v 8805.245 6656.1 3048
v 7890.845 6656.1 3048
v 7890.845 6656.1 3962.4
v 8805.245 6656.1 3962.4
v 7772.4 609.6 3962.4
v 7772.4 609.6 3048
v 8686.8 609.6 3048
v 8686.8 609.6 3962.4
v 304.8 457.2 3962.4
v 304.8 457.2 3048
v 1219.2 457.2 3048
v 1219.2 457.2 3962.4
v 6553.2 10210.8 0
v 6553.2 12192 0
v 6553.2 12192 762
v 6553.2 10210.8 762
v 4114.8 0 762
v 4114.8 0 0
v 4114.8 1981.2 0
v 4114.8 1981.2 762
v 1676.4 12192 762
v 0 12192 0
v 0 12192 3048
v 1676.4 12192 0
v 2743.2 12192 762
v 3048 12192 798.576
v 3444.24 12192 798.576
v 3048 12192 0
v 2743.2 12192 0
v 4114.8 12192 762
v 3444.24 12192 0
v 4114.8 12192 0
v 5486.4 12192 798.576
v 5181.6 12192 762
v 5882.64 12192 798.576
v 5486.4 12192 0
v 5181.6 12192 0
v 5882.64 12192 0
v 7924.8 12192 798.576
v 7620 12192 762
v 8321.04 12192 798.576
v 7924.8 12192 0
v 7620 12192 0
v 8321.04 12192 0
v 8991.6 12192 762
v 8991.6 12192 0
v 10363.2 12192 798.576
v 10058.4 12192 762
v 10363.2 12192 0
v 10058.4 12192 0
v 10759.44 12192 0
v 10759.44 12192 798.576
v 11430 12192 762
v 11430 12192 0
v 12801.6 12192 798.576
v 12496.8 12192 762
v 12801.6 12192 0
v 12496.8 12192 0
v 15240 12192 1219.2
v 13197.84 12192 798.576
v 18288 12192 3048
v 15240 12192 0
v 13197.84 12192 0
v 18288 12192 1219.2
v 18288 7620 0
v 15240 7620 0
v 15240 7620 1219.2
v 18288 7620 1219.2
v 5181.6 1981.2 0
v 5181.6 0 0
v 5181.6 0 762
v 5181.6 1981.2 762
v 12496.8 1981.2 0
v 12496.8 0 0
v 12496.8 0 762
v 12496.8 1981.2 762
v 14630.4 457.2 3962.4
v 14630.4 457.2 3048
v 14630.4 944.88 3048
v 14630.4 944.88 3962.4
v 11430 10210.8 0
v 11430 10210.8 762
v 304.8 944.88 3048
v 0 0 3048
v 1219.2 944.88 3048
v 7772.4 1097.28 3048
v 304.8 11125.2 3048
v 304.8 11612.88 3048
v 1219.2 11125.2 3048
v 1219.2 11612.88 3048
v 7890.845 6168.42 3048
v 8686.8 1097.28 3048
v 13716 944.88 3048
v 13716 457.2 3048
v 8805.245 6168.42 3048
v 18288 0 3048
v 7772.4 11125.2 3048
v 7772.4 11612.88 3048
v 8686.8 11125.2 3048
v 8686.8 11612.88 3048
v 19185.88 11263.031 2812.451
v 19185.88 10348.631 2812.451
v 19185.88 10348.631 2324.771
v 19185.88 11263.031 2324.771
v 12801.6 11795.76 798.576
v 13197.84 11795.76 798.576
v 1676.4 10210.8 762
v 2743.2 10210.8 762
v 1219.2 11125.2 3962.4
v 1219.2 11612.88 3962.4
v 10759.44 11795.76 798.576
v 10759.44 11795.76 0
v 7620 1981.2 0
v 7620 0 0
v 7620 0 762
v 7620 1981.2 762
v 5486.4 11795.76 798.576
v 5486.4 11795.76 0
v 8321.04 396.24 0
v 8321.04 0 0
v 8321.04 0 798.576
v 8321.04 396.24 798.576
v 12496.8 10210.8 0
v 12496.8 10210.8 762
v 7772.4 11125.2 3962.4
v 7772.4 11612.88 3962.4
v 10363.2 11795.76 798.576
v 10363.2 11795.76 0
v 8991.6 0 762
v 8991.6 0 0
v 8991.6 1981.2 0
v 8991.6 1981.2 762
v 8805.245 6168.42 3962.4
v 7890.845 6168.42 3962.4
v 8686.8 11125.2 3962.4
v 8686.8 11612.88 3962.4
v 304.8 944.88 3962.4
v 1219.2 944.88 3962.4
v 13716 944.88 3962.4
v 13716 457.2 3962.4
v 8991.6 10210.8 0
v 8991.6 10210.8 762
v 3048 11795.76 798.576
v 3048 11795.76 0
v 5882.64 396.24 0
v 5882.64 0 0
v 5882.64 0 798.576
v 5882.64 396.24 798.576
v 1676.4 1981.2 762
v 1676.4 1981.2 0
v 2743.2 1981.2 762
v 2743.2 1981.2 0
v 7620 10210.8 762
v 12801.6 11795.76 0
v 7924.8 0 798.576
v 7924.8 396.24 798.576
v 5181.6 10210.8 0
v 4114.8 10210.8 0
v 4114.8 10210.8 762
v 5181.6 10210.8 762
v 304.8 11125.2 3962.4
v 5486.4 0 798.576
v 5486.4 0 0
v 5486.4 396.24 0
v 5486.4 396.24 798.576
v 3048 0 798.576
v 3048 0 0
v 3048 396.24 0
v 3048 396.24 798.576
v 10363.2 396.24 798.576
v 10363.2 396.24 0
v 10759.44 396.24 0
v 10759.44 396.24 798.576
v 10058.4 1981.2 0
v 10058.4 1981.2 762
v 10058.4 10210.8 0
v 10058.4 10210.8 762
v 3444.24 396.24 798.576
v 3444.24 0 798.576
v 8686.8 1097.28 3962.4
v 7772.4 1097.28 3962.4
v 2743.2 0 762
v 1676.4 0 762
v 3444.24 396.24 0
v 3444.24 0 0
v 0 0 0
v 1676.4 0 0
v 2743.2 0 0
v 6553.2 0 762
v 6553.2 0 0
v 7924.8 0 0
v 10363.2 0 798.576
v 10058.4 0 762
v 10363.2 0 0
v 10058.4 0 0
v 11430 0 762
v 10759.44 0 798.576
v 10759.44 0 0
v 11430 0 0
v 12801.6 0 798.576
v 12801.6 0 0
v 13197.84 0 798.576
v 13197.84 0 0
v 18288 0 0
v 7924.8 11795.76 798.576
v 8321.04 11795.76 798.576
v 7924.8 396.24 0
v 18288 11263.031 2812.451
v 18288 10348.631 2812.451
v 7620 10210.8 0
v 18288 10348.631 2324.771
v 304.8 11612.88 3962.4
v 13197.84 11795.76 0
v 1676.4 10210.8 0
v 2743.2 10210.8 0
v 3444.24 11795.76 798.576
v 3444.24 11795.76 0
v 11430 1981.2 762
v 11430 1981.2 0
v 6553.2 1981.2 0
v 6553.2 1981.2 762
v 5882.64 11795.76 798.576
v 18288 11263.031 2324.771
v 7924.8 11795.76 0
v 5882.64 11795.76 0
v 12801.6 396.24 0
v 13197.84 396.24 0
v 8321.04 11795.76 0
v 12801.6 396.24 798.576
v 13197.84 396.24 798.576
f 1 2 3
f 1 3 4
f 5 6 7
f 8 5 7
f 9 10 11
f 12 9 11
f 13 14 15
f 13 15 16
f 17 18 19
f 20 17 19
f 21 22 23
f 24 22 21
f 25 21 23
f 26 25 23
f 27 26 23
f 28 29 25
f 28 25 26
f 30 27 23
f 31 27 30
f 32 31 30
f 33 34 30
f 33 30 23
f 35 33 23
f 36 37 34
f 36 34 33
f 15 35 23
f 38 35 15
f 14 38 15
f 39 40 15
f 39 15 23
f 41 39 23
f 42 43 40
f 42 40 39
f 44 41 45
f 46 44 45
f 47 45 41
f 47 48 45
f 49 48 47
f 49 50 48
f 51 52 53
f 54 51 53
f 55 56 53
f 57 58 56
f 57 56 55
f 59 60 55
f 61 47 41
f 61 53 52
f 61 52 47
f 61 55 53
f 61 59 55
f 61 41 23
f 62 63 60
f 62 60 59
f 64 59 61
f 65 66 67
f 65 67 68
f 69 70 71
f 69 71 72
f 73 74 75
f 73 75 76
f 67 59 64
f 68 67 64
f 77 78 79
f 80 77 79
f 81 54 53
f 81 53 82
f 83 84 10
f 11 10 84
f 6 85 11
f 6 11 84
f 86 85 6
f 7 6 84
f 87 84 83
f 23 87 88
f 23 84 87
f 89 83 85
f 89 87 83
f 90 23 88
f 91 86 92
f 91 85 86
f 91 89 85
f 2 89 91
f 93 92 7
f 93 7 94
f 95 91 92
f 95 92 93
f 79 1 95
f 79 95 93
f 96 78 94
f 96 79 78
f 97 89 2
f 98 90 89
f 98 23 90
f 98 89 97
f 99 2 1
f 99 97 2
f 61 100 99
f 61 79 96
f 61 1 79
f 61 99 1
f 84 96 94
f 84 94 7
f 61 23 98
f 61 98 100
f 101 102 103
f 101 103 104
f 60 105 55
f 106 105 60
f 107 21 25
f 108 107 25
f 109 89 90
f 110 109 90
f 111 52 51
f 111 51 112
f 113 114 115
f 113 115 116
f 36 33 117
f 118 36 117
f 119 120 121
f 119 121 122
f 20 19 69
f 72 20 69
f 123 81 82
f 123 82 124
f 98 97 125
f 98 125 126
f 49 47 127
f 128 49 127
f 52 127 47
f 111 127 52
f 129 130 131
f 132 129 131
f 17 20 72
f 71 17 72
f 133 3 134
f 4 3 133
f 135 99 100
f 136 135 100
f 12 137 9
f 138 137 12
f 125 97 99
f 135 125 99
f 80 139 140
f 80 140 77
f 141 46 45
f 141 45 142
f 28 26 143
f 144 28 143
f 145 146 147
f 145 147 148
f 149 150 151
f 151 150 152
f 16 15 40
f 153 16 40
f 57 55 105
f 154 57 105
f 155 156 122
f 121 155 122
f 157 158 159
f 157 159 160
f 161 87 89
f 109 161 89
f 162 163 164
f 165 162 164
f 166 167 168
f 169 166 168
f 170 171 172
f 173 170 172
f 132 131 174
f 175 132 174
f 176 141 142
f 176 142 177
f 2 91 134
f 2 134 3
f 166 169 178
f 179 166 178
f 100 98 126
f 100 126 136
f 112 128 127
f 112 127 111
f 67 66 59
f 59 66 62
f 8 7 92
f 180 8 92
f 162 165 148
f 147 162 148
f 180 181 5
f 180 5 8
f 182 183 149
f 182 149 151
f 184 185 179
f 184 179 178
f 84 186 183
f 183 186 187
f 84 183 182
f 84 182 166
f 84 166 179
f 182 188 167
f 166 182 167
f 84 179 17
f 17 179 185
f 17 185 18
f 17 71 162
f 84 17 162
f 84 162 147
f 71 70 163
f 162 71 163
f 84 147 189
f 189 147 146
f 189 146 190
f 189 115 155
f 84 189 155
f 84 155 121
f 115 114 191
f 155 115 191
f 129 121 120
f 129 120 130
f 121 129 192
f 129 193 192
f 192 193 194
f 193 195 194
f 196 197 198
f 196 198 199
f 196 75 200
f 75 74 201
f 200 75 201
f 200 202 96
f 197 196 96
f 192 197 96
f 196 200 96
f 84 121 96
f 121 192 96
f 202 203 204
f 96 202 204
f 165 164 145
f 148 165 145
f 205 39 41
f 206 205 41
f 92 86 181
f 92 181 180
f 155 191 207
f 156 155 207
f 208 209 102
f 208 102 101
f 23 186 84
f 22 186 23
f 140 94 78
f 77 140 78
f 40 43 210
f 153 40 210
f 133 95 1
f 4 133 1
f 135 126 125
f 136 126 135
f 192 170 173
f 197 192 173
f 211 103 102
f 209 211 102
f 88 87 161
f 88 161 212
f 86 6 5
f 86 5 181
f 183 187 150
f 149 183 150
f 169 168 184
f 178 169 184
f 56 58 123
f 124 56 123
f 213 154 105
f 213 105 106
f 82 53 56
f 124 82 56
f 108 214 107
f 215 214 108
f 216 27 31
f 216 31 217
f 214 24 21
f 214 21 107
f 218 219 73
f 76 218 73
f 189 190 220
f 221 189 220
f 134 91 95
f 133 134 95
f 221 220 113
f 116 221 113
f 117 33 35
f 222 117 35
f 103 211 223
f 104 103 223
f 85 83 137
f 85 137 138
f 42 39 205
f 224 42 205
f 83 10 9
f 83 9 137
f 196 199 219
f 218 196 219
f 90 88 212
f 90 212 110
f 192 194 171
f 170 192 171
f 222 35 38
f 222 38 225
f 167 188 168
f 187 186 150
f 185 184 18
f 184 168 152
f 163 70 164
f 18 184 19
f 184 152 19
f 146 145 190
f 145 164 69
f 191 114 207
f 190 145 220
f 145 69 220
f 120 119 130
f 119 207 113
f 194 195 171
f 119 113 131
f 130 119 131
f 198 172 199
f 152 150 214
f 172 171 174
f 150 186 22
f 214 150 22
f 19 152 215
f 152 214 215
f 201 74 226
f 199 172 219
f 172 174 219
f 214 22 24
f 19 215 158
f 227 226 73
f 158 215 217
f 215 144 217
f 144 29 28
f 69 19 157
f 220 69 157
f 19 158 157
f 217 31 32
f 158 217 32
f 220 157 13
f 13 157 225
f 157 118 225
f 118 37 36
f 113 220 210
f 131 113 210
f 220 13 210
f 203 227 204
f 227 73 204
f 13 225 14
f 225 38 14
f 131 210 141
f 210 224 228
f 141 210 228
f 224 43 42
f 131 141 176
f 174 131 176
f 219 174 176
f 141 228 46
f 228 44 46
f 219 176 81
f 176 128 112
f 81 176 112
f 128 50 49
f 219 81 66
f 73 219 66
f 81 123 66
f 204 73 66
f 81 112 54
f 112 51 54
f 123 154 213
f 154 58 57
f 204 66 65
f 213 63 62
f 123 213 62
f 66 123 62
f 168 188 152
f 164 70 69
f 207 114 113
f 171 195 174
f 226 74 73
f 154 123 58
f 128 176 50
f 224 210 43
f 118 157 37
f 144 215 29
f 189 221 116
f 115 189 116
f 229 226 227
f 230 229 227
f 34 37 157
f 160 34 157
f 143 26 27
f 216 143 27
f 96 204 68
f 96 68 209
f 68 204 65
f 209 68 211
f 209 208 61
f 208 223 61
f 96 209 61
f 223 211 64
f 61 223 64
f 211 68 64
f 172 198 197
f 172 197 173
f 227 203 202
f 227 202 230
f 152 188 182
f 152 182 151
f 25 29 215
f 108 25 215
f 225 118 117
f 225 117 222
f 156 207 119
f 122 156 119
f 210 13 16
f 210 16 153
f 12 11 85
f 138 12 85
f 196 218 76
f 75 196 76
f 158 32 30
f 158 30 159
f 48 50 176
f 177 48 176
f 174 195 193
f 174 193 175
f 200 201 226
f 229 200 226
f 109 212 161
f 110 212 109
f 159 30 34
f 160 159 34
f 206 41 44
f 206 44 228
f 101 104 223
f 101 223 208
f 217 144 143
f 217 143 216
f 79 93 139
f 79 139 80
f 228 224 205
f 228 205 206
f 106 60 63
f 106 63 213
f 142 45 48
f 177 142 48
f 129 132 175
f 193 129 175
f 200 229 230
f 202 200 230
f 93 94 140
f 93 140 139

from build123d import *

# Parameters (mm, degrees)
BOX006_W     = 1066.8
BOX006_H     = 1981.2
BOX006_DEPTH = 762
BOX005_W     = 396.24
BOX005_H     = 396.24
BOX005_DEPTH = 798.576
BOX007_W     = 1066.8
BOX007_H     = 1981.2
BOX007_DEPTH = 762
BOX008_W     = 396.24
BOX008_H     = 396.24
BOX008_DEPTH = 798.576
BOX010_W     = 1066.8
BOX010_H     = 1981.2
BOX010_DEPTH = 762
BOX009_W     = 396.24
BOX009_H     = 396.24
BOX009_DEPTH = 798.576
BOX001_W     = 1066.8
BOX001_H     = 1981.2
BOX001_DEPTH = 762
BOX002_W     = 396.24
BOX002_H     = 396.24
BOX002_DEPTH = 798.576
BOX003_W     = 1066.8
BOX003_H     = 1981.2
BOX003_DEPTH = 762
BOX004_W     = 396.24
BOX004_H     = 396.24
BOX004_DEPTH = 798.576
BOX011_W     = 3048
BOX011_H     = 4572
BOX011_DEPTH = 1219.2
BOX_W        = 18288
BOX_H        = 12192
BOX_DEPTH    = 3048
BOX022_W     = 914.4
BOX022_H     = 487.68
BOX022_DEPTH = 1219.2
BOX020_W     = 914.4
BOX020_H     = 487.68
BOX020_DEPTH = 1219.2
BOX018_W     = 914.4
BOX018_H     = 487.68
BOX018_DEPTH = 1219.2
BOX019_W     = 914.4
BOX019_H     = 487.68
BOX019_DEPTH = 1219.2
BOX015_W     = 914.4
BOX015_H     = 487.68
BOX015_DEPTH = 1219.2
BOX021_W     = 914.4
BOX021_H     = 487.68
BOX021_DEPTH = 1219.2
BOX023_W     = 914.4
BOX023_H     = 487.68
BOX023_DEPTH = 1219.2


with BuildPart() as box006:
    # Box006 → Box006 (new body)
    with BuildSketch(Plane.XY):
        with Locations((533.4, 990.6)):
            Rectangle(BOX006_W, BOX006_H)
    extrude(amount=BOX006_DEPTH)


with BuildPart() as fusion002:
    # Box005 → Box005 (new body)
    with BuildSketch(Plane(origin=(1371.6, 0, 0), x_dir=(1, 0, 0), z_dir=(0, 0, 1))):
        with Locations((198.12, 198.12)):
            Rectangle(BOX005_W, BOX005_H)
    extrude(amount=BOX005_DEPTH)

    # Fusion002: union Box006
    add(box006.part)


with BuildPart() as fusion002_1:
    # Fusion002 placement: moved
    add(fusion002.part.moved(Location((4876.8, 0, 0))))


with BuildPart() as box007:
    # Box007 → Box007 (new body)
    with BuildSketch(Plane.XY):
        with Locations((533.4, 990.6)):
            Rectangle(BOX007_W, BOX007_H)
    extrude(amount=BOX007_DEPTH)


with BuildPart() as fusion003:
    # Box008 → Box008 (new body)
    with BuildSketch(Plane(origin=(1371.6, 0, 0), x_dir=(1, 0, 0), z_dir=(0, 0, 1))):
        with Locations((198.12, 198.12)):
            Rectangle(BOX008_W, BOX008_H)
    extrude(amount=BOX008_DEPTH)

    # Fusion003: union Box007
    add(box007.part)


with BuildPart() as fusion003_1:
    # Fusion003 placement: moved
    add(fusion003.part.moved(Location((7315.2, 0, 0))))


with BuildPart() as box010:
    # Box010 → Box010 (new body)
    with BuildSketch(Plane.XY):
        with Locations((533.4, 990.6)):
            Rectangle(BOX010_W, BOX010_H)
    extrude(amount=BOX010_DEPTH)


with BuildPart() as fusion004:
    # Box009 → Box009 (new body)
    with BuildSketch(Plane(origin=(1371.6, 0, 0), x_dir=(1, 0, 0), z_dir=(0, 0, 1))):
        with Locations((198.12, 198.12)):
            Rectangle(BOX009_W, BOX009_H)
    extrude(amount=BOX009_DEPTH)

    # Fusion004: union Box010
    add(box010.part)


with BuildPart() as fusion004_1:
    # Fusion004 placement: moved
    add(fusion004.part.moved(Location((9753.6, 0, 0))))


with BuildPart() as box001:
    # Box001 → Box001 (new body)
    with BuildSketch(Plane.XY):
        with Locations((533.4, 990.6)):
            Rectangle(BOX001_W, BOX001_H)
    extrude(amount=BOX001_DEPTH)


with BuildPart() as fusion:
    # Box002 → Box002 (new body)
    with BuildSketch(Plane(origin=(1371.6, 0, 0), x_dir=(1, 0, 0), z_dir=(0, 0, 1))):
        with Locations((198.12, 198.12)):
            Rectangle(BOX002_W, BOX002_H)
    extrude(amount=BOX002_DEPTH)

    # Fusion: union Box001
    add(box001.part)


with BuildPart() as box003:
    # Box003 → Box003 (new body)
    with BuildSketch(Plane.XY):
        with Locations((533.4, 990.6)):
            Rectangle(BOX003_W, BOX003_H)
    extrude(amount=BOX003_DEPTH)


with BuildPart() as right_beds:
    # Box004 → Box004 (new body)
    with BuildSketch(Plane(origin=(1371.6, 0, 0), x_dir=(1, 0, 0), z_dir=(0, 0, 1))):
        with Locations((198.12, 198.12)):
            Rectangle(BOX004_W, BOX004_H)
    extrude(amount=BOX004_DEPTH)

    # Fusion001: union Box003
    add(box003.part)


with BuildPart() as right_beds_1:
    # Fusion001 placement: moved
    add(right_beds.part.moved(Location((2438.4, 0, 0))))

    # Fusion005: union Fusion002, Fusion003, Fusion004, Fusion
    add(fusion002_1.part)
    add(fusion003_1.part)
    add(fusion004_1.part)
    add(fusion.part)


with BuildPart() as all_beds:
    # Part__Mirroring: instance of right beds
    add(right_beds_1.part.mirror(Plane(origin=(0, 6096, 0), x_dir=(1, 0, 0), z_dir=(0, 1, 0))))

    # Fusion006: union right beds
    add(right_beds_1.part)


with BuildPart() as all_beds_1:
    # Fusion006 placement: moved
    add(all_beds.part.moved(Location((1676.4, 0, 0))))


with BuildPart() as surfaces:
    # Box011 → Box011 (new body)
    with BuildSketch(Plane(origin=(15240, 7620, 0), x_dir=(1, 0, 0), z_dir=(0, 0, 1))):
        with Locations((1524, 2286)):
            Rectangle(BOX011_W, BOX011_H)
    extrude(amount=BOX011_DEPTH)

    # Fusion008: union all beds
    add(all_beds_1.part)


with BuildPart() as room:
    # Box → Box (new body)
    with BuildSketch(Plane.XY):
        with Locations((9144, 6096)):
            Rectangle(BOX_W, BOX_H)
    extrude(amount=BOX_DEPTH)


with BuildPart() as box022:
    # Box022 → Box022 (new body)
    with BuildSketch(Plane(origin=(17966.67984, 10348.63056, 2324.77056), x_dir=(0, 1, 0), z_dir=(1, 0, 0))):
        with Locations((457.2, 243.84)):
            Rectangle(BOX022_W, BOX022_H)
    extrude(amount=BOX022_DEPTH)


with BuildPart() as box020:
    # Box020 → Box020 (new body)
    with BuildSketch(Plane(origin=(7772.4, 11125.2, 2743.2), x_dir=(1, 0, 0), z_dir=(0, 0, 1))):
        with Locations((457.2, 243.84)):
            Rectangle(BOX020_W, BOX020_H)
    extrude(amount=BOX020_DEPTH)


with BuildPart() as box018:
    # Box018 → Box018 (new body)
    with BuildSketch(Plane(origin=(304.8, 457.2, 2743.2), x_dir=(1, 0, 0), z_dir=(0, 0, 1))):
        with Locations((457.2, 243.84)):
            Rectangle(BOX018_W, BOX018_H)
    extrude(amount=BOX018_DEPTH)


with BuildPart() as box019:
    # Box019 → Box019 (new body)
    with BuildSketch(Plane(origin=(304.8, 11125.2, 2743.2), x_dir=(1, 0, 0), z_dir=(0, 0, 1))):
        with Locations((457.2, 243.84)):
            Rectangle(BOX019_W, BOX019_H)
    extrude(amount=BOX019_DEPTH)


with BuildPart() as box015:
    # Box015 → Box015 (new body)
    with BuildSketch(Plane(origin=(13716, 457.2, 2743.2), x_dir=(1, 0, 0), z_dir=(0, 0, 1))):
        with Locations((457.2, 243.84)):
            Rectangle(BOX015_W, BOX015_H)
    extrude(amount=BOX015_DEPTH)


with BuildPart() as box021:
    # Box021 → Box021 (new body)
    with BuildSketch(Plane(origin=(7772.4, 609.6, 2743.2), x_dir=(1, 0, 0), z_dir=(0, 0, 1))):
        with Locations((457.2, 243.84)):
            Rectangle(BOX021_W, BOX021_H)
    extrude(amount=BOX021_DEPTH)


with BuildPart() as cut:
    # Box023 → Box023 (new body)
    with BuildSketch(Plane(origin=(7890.84528, 6168.42048, 2743.2), x_dir=(1, 0, 0), z_dir=(0, 0, 1))):
        with Locations((457.2, 243.84)):
            Rectangle(BOX023_W, BOX023_H)
    extrude(amount=BOX023_DEPTH)

    # Fusion009: union Box022, Box020, Box018, Box019, Box015, Box021
    add(box022.part)
    add(box020.part)
    add(box018.part)
    add(box019.part)
    add(box015.part)
    add(box021.part)

    # Fusion010: union Room
    add(room.part)

    # Cut: cut surfaces
    add(surfaces.part, mode=Mode.SUBTRACT)


solid = cut.part
